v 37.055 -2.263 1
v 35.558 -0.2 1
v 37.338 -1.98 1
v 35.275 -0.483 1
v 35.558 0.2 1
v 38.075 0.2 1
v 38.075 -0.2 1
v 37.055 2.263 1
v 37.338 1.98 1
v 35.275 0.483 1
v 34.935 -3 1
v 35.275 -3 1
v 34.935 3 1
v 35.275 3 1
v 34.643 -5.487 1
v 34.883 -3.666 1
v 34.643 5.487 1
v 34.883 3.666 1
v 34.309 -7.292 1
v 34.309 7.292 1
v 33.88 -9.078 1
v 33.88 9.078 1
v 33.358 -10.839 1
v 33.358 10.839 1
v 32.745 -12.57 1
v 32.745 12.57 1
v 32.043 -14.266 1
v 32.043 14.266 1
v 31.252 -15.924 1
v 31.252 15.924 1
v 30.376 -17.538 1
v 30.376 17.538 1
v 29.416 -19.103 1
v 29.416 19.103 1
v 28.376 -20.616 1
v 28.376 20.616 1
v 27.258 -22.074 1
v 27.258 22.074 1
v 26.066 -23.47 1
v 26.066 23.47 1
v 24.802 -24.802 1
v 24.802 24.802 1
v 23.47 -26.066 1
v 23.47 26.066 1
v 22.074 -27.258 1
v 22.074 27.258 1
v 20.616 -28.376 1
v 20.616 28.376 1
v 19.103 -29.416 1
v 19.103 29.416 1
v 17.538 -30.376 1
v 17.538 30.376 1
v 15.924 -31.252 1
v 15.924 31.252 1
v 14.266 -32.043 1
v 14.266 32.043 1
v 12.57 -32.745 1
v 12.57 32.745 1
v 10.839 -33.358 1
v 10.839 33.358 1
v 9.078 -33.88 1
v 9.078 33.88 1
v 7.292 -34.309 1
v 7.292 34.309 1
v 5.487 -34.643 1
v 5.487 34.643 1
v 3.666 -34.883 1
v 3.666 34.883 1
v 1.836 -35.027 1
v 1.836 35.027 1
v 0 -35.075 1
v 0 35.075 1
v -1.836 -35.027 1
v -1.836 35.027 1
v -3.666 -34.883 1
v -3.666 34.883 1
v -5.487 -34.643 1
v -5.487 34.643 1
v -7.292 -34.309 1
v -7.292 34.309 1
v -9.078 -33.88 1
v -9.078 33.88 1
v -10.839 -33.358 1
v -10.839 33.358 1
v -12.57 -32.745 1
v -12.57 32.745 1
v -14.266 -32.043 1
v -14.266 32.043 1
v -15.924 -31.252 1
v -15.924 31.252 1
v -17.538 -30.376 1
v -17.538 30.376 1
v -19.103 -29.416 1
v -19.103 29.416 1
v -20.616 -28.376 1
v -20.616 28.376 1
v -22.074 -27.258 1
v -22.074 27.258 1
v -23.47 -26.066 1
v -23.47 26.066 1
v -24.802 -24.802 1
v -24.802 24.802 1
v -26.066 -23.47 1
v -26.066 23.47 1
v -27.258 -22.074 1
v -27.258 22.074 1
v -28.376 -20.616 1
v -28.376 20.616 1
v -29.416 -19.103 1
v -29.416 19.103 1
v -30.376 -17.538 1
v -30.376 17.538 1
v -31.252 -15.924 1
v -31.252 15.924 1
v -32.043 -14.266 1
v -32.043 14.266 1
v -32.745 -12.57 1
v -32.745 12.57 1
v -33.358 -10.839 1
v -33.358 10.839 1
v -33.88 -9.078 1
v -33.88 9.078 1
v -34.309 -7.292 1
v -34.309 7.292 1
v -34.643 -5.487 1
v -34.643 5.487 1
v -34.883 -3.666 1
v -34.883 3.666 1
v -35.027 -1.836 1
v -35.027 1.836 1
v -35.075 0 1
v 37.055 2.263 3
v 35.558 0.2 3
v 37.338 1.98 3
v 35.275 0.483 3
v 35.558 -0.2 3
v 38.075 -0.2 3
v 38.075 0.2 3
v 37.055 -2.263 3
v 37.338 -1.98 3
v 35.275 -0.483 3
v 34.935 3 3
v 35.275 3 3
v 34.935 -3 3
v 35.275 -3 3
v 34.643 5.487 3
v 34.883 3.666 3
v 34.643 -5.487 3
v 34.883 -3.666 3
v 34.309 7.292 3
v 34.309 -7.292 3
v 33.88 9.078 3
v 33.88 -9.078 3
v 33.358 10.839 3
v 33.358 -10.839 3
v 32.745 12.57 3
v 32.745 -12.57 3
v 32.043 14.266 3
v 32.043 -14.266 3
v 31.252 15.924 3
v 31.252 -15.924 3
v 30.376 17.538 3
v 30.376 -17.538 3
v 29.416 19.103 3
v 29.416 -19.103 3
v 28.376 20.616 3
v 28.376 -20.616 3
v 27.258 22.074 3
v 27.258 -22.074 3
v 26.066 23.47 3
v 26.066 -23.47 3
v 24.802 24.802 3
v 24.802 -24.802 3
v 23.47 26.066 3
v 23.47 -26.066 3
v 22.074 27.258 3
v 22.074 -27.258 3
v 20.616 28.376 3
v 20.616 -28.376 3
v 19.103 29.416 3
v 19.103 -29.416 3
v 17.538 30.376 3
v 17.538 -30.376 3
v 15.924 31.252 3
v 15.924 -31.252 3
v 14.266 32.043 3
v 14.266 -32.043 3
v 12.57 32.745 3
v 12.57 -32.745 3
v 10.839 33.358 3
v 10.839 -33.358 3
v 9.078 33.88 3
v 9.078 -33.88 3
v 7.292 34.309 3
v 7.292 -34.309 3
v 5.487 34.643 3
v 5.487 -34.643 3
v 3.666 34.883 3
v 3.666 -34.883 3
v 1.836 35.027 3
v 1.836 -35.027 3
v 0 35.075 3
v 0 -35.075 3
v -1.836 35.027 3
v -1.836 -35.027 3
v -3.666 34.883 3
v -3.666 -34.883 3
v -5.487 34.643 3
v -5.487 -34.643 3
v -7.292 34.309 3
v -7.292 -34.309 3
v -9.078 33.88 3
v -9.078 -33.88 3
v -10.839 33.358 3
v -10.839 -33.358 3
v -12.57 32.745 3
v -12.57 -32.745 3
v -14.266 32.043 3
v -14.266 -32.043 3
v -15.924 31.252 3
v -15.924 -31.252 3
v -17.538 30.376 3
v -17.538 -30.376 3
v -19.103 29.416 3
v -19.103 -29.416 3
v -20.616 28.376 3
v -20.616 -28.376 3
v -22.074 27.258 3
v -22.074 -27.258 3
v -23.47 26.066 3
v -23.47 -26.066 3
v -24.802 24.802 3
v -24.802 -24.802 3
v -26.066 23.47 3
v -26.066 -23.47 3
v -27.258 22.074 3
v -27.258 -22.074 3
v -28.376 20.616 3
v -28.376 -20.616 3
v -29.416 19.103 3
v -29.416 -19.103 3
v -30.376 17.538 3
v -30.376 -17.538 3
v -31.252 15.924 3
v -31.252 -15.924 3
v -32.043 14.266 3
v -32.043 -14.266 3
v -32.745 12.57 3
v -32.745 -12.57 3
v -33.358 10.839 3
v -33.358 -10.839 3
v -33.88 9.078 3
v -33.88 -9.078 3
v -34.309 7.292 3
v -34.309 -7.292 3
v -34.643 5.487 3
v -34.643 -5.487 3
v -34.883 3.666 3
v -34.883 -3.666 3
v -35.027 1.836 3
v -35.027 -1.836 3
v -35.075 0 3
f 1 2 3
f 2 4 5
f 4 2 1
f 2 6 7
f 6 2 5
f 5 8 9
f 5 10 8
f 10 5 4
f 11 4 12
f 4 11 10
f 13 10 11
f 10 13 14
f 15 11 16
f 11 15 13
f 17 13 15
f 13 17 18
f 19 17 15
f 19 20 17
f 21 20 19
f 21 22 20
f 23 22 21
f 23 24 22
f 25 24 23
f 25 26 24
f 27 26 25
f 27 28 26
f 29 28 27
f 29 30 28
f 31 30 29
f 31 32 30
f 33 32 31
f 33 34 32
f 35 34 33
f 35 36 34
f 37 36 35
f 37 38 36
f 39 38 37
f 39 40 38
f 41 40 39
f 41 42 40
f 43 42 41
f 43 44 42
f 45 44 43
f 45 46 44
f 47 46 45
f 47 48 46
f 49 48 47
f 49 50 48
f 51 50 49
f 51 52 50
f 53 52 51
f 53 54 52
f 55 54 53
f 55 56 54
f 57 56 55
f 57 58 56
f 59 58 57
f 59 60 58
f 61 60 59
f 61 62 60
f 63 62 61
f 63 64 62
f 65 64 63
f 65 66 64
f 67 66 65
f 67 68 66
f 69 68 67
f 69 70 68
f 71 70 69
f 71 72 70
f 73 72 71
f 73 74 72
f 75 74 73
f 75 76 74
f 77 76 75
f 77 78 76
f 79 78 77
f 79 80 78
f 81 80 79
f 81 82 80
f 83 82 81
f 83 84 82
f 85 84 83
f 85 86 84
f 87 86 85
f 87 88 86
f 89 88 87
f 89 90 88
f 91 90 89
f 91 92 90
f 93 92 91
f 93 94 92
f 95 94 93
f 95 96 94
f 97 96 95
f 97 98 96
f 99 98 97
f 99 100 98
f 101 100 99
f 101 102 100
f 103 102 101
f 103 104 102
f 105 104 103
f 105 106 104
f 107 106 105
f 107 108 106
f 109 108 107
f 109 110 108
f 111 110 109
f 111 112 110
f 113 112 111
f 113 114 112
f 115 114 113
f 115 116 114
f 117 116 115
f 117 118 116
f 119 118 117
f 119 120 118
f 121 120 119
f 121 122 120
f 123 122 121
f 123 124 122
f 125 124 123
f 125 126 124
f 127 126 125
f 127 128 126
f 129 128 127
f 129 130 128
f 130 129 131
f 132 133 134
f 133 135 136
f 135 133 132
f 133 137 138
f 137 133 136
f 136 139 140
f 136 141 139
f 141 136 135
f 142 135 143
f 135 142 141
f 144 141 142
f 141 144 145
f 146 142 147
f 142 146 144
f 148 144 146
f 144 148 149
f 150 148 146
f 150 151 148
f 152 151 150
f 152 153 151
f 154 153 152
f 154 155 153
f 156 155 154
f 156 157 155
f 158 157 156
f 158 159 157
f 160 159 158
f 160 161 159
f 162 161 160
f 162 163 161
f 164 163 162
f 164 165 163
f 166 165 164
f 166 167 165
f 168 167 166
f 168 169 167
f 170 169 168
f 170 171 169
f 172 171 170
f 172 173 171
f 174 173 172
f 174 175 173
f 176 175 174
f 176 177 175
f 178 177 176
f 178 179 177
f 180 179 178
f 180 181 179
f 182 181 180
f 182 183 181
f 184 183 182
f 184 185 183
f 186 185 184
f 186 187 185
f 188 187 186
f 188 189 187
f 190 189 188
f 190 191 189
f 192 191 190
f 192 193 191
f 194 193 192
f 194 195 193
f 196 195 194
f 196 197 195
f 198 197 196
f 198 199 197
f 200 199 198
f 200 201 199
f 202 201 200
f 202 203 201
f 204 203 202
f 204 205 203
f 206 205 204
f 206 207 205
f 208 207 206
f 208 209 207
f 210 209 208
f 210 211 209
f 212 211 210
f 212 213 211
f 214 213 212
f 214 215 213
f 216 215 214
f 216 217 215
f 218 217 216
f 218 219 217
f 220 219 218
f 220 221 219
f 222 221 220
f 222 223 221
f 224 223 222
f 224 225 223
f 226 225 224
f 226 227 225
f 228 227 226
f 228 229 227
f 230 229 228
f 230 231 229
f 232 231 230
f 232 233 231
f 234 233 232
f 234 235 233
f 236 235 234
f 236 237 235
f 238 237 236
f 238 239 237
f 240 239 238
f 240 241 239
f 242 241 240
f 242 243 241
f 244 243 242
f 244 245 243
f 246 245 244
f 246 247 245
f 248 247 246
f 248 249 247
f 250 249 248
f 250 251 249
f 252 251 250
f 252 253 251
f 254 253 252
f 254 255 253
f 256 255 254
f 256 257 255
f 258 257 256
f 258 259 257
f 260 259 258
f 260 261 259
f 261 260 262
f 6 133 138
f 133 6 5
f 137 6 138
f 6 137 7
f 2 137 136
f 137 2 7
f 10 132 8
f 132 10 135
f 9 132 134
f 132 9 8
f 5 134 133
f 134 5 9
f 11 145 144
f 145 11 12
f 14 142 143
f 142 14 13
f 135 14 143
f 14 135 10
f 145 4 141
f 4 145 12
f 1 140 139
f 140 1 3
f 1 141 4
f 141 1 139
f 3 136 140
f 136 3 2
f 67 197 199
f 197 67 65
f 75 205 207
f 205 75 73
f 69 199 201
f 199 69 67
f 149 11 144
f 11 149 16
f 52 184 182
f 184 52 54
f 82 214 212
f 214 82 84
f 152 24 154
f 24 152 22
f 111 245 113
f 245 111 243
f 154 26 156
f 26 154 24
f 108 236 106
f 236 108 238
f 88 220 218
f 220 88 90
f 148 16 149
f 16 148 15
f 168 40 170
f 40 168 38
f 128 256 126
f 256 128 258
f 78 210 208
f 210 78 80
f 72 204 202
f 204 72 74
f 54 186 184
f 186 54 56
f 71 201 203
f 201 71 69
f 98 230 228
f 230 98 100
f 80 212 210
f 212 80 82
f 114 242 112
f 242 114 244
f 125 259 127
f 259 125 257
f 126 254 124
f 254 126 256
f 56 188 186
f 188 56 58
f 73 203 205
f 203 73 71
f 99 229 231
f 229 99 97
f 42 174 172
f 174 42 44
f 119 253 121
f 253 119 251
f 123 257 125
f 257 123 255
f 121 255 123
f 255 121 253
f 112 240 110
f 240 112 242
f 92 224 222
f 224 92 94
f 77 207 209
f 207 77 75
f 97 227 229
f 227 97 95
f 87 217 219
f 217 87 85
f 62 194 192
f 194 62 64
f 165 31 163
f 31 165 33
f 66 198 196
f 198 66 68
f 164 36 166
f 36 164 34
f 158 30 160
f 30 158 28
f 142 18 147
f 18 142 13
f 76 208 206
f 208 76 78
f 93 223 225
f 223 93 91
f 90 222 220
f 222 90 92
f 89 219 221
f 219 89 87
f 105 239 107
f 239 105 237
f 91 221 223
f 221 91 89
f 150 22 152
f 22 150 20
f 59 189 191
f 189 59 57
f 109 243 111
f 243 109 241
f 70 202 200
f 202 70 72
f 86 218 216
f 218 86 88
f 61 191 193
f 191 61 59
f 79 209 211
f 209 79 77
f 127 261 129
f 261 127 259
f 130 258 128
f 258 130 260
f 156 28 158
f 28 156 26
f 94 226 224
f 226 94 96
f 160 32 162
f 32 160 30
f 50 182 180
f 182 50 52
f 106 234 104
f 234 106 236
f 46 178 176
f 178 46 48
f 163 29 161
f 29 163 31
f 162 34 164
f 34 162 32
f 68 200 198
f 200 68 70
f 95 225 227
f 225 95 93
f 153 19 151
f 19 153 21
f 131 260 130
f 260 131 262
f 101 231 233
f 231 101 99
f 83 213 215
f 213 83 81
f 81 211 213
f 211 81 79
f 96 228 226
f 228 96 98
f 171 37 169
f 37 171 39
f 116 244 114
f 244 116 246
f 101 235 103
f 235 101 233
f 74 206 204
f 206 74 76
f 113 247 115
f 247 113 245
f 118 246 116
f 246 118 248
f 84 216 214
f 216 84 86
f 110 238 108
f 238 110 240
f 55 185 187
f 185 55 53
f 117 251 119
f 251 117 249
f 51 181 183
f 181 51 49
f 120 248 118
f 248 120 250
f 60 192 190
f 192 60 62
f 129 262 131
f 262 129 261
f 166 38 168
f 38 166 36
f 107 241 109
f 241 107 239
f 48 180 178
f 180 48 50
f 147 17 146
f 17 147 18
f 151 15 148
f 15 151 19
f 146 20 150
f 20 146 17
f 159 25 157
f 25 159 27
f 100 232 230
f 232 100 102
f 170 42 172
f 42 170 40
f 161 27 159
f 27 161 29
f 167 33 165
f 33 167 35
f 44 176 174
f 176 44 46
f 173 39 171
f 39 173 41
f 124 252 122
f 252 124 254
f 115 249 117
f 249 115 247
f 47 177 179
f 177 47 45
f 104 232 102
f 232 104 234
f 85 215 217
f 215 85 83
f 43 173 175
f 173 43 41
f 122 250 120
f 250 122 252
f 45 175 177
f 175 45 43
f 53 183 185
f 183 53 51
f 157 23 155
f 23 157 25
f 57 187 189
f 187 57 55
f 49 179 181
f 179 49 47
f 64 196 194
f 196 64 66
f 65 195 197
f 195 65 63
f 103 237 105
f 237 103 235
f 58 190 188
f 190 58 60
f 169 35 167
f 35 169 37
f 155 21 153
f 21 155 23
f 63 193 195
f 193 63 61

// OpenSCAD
// ==== Shared Parameters ====
// Measure your pedestal's internal rebate (seat) carefully.
cavity_w   = 70;    // inner width (mm)
cavity_d   = 70;    // inner depth (mm)
lip_depth  = 2;     // rebate depth available for the diffuser to sit in (mm)
thickness  = 2.0;   // diffuser thickness (mm)
clearance  = 0.3;   // positive clearance for sit-on fit (mm)
chamfer    = 0.6;   // small edge break

/*
  Round diffuser — snap-in with micro barbs
*/
$fn=120;
barb_h = 0.4;
barb_w = 6;
barb_count = 8;

diam = min(cavity_w, cavity_d) + (clearance/2);

translate([0,0,thickness/2])
  linear_extrude(height=thickness)
    offset(delta=-chamfer) offset(delta=+chamfer)
      circle(r=diam/2);

// barbs placed radially
for (i=[0:barb_count-1]) {
  ang = 360/barb_count * i;
  translate([ (diam/2), 0, lip_depth/2 ])
    rotate([0,0,ang])
      linear_extrude(height=lip_depth)
        square([barb_w, barb_h], center=true);
}
